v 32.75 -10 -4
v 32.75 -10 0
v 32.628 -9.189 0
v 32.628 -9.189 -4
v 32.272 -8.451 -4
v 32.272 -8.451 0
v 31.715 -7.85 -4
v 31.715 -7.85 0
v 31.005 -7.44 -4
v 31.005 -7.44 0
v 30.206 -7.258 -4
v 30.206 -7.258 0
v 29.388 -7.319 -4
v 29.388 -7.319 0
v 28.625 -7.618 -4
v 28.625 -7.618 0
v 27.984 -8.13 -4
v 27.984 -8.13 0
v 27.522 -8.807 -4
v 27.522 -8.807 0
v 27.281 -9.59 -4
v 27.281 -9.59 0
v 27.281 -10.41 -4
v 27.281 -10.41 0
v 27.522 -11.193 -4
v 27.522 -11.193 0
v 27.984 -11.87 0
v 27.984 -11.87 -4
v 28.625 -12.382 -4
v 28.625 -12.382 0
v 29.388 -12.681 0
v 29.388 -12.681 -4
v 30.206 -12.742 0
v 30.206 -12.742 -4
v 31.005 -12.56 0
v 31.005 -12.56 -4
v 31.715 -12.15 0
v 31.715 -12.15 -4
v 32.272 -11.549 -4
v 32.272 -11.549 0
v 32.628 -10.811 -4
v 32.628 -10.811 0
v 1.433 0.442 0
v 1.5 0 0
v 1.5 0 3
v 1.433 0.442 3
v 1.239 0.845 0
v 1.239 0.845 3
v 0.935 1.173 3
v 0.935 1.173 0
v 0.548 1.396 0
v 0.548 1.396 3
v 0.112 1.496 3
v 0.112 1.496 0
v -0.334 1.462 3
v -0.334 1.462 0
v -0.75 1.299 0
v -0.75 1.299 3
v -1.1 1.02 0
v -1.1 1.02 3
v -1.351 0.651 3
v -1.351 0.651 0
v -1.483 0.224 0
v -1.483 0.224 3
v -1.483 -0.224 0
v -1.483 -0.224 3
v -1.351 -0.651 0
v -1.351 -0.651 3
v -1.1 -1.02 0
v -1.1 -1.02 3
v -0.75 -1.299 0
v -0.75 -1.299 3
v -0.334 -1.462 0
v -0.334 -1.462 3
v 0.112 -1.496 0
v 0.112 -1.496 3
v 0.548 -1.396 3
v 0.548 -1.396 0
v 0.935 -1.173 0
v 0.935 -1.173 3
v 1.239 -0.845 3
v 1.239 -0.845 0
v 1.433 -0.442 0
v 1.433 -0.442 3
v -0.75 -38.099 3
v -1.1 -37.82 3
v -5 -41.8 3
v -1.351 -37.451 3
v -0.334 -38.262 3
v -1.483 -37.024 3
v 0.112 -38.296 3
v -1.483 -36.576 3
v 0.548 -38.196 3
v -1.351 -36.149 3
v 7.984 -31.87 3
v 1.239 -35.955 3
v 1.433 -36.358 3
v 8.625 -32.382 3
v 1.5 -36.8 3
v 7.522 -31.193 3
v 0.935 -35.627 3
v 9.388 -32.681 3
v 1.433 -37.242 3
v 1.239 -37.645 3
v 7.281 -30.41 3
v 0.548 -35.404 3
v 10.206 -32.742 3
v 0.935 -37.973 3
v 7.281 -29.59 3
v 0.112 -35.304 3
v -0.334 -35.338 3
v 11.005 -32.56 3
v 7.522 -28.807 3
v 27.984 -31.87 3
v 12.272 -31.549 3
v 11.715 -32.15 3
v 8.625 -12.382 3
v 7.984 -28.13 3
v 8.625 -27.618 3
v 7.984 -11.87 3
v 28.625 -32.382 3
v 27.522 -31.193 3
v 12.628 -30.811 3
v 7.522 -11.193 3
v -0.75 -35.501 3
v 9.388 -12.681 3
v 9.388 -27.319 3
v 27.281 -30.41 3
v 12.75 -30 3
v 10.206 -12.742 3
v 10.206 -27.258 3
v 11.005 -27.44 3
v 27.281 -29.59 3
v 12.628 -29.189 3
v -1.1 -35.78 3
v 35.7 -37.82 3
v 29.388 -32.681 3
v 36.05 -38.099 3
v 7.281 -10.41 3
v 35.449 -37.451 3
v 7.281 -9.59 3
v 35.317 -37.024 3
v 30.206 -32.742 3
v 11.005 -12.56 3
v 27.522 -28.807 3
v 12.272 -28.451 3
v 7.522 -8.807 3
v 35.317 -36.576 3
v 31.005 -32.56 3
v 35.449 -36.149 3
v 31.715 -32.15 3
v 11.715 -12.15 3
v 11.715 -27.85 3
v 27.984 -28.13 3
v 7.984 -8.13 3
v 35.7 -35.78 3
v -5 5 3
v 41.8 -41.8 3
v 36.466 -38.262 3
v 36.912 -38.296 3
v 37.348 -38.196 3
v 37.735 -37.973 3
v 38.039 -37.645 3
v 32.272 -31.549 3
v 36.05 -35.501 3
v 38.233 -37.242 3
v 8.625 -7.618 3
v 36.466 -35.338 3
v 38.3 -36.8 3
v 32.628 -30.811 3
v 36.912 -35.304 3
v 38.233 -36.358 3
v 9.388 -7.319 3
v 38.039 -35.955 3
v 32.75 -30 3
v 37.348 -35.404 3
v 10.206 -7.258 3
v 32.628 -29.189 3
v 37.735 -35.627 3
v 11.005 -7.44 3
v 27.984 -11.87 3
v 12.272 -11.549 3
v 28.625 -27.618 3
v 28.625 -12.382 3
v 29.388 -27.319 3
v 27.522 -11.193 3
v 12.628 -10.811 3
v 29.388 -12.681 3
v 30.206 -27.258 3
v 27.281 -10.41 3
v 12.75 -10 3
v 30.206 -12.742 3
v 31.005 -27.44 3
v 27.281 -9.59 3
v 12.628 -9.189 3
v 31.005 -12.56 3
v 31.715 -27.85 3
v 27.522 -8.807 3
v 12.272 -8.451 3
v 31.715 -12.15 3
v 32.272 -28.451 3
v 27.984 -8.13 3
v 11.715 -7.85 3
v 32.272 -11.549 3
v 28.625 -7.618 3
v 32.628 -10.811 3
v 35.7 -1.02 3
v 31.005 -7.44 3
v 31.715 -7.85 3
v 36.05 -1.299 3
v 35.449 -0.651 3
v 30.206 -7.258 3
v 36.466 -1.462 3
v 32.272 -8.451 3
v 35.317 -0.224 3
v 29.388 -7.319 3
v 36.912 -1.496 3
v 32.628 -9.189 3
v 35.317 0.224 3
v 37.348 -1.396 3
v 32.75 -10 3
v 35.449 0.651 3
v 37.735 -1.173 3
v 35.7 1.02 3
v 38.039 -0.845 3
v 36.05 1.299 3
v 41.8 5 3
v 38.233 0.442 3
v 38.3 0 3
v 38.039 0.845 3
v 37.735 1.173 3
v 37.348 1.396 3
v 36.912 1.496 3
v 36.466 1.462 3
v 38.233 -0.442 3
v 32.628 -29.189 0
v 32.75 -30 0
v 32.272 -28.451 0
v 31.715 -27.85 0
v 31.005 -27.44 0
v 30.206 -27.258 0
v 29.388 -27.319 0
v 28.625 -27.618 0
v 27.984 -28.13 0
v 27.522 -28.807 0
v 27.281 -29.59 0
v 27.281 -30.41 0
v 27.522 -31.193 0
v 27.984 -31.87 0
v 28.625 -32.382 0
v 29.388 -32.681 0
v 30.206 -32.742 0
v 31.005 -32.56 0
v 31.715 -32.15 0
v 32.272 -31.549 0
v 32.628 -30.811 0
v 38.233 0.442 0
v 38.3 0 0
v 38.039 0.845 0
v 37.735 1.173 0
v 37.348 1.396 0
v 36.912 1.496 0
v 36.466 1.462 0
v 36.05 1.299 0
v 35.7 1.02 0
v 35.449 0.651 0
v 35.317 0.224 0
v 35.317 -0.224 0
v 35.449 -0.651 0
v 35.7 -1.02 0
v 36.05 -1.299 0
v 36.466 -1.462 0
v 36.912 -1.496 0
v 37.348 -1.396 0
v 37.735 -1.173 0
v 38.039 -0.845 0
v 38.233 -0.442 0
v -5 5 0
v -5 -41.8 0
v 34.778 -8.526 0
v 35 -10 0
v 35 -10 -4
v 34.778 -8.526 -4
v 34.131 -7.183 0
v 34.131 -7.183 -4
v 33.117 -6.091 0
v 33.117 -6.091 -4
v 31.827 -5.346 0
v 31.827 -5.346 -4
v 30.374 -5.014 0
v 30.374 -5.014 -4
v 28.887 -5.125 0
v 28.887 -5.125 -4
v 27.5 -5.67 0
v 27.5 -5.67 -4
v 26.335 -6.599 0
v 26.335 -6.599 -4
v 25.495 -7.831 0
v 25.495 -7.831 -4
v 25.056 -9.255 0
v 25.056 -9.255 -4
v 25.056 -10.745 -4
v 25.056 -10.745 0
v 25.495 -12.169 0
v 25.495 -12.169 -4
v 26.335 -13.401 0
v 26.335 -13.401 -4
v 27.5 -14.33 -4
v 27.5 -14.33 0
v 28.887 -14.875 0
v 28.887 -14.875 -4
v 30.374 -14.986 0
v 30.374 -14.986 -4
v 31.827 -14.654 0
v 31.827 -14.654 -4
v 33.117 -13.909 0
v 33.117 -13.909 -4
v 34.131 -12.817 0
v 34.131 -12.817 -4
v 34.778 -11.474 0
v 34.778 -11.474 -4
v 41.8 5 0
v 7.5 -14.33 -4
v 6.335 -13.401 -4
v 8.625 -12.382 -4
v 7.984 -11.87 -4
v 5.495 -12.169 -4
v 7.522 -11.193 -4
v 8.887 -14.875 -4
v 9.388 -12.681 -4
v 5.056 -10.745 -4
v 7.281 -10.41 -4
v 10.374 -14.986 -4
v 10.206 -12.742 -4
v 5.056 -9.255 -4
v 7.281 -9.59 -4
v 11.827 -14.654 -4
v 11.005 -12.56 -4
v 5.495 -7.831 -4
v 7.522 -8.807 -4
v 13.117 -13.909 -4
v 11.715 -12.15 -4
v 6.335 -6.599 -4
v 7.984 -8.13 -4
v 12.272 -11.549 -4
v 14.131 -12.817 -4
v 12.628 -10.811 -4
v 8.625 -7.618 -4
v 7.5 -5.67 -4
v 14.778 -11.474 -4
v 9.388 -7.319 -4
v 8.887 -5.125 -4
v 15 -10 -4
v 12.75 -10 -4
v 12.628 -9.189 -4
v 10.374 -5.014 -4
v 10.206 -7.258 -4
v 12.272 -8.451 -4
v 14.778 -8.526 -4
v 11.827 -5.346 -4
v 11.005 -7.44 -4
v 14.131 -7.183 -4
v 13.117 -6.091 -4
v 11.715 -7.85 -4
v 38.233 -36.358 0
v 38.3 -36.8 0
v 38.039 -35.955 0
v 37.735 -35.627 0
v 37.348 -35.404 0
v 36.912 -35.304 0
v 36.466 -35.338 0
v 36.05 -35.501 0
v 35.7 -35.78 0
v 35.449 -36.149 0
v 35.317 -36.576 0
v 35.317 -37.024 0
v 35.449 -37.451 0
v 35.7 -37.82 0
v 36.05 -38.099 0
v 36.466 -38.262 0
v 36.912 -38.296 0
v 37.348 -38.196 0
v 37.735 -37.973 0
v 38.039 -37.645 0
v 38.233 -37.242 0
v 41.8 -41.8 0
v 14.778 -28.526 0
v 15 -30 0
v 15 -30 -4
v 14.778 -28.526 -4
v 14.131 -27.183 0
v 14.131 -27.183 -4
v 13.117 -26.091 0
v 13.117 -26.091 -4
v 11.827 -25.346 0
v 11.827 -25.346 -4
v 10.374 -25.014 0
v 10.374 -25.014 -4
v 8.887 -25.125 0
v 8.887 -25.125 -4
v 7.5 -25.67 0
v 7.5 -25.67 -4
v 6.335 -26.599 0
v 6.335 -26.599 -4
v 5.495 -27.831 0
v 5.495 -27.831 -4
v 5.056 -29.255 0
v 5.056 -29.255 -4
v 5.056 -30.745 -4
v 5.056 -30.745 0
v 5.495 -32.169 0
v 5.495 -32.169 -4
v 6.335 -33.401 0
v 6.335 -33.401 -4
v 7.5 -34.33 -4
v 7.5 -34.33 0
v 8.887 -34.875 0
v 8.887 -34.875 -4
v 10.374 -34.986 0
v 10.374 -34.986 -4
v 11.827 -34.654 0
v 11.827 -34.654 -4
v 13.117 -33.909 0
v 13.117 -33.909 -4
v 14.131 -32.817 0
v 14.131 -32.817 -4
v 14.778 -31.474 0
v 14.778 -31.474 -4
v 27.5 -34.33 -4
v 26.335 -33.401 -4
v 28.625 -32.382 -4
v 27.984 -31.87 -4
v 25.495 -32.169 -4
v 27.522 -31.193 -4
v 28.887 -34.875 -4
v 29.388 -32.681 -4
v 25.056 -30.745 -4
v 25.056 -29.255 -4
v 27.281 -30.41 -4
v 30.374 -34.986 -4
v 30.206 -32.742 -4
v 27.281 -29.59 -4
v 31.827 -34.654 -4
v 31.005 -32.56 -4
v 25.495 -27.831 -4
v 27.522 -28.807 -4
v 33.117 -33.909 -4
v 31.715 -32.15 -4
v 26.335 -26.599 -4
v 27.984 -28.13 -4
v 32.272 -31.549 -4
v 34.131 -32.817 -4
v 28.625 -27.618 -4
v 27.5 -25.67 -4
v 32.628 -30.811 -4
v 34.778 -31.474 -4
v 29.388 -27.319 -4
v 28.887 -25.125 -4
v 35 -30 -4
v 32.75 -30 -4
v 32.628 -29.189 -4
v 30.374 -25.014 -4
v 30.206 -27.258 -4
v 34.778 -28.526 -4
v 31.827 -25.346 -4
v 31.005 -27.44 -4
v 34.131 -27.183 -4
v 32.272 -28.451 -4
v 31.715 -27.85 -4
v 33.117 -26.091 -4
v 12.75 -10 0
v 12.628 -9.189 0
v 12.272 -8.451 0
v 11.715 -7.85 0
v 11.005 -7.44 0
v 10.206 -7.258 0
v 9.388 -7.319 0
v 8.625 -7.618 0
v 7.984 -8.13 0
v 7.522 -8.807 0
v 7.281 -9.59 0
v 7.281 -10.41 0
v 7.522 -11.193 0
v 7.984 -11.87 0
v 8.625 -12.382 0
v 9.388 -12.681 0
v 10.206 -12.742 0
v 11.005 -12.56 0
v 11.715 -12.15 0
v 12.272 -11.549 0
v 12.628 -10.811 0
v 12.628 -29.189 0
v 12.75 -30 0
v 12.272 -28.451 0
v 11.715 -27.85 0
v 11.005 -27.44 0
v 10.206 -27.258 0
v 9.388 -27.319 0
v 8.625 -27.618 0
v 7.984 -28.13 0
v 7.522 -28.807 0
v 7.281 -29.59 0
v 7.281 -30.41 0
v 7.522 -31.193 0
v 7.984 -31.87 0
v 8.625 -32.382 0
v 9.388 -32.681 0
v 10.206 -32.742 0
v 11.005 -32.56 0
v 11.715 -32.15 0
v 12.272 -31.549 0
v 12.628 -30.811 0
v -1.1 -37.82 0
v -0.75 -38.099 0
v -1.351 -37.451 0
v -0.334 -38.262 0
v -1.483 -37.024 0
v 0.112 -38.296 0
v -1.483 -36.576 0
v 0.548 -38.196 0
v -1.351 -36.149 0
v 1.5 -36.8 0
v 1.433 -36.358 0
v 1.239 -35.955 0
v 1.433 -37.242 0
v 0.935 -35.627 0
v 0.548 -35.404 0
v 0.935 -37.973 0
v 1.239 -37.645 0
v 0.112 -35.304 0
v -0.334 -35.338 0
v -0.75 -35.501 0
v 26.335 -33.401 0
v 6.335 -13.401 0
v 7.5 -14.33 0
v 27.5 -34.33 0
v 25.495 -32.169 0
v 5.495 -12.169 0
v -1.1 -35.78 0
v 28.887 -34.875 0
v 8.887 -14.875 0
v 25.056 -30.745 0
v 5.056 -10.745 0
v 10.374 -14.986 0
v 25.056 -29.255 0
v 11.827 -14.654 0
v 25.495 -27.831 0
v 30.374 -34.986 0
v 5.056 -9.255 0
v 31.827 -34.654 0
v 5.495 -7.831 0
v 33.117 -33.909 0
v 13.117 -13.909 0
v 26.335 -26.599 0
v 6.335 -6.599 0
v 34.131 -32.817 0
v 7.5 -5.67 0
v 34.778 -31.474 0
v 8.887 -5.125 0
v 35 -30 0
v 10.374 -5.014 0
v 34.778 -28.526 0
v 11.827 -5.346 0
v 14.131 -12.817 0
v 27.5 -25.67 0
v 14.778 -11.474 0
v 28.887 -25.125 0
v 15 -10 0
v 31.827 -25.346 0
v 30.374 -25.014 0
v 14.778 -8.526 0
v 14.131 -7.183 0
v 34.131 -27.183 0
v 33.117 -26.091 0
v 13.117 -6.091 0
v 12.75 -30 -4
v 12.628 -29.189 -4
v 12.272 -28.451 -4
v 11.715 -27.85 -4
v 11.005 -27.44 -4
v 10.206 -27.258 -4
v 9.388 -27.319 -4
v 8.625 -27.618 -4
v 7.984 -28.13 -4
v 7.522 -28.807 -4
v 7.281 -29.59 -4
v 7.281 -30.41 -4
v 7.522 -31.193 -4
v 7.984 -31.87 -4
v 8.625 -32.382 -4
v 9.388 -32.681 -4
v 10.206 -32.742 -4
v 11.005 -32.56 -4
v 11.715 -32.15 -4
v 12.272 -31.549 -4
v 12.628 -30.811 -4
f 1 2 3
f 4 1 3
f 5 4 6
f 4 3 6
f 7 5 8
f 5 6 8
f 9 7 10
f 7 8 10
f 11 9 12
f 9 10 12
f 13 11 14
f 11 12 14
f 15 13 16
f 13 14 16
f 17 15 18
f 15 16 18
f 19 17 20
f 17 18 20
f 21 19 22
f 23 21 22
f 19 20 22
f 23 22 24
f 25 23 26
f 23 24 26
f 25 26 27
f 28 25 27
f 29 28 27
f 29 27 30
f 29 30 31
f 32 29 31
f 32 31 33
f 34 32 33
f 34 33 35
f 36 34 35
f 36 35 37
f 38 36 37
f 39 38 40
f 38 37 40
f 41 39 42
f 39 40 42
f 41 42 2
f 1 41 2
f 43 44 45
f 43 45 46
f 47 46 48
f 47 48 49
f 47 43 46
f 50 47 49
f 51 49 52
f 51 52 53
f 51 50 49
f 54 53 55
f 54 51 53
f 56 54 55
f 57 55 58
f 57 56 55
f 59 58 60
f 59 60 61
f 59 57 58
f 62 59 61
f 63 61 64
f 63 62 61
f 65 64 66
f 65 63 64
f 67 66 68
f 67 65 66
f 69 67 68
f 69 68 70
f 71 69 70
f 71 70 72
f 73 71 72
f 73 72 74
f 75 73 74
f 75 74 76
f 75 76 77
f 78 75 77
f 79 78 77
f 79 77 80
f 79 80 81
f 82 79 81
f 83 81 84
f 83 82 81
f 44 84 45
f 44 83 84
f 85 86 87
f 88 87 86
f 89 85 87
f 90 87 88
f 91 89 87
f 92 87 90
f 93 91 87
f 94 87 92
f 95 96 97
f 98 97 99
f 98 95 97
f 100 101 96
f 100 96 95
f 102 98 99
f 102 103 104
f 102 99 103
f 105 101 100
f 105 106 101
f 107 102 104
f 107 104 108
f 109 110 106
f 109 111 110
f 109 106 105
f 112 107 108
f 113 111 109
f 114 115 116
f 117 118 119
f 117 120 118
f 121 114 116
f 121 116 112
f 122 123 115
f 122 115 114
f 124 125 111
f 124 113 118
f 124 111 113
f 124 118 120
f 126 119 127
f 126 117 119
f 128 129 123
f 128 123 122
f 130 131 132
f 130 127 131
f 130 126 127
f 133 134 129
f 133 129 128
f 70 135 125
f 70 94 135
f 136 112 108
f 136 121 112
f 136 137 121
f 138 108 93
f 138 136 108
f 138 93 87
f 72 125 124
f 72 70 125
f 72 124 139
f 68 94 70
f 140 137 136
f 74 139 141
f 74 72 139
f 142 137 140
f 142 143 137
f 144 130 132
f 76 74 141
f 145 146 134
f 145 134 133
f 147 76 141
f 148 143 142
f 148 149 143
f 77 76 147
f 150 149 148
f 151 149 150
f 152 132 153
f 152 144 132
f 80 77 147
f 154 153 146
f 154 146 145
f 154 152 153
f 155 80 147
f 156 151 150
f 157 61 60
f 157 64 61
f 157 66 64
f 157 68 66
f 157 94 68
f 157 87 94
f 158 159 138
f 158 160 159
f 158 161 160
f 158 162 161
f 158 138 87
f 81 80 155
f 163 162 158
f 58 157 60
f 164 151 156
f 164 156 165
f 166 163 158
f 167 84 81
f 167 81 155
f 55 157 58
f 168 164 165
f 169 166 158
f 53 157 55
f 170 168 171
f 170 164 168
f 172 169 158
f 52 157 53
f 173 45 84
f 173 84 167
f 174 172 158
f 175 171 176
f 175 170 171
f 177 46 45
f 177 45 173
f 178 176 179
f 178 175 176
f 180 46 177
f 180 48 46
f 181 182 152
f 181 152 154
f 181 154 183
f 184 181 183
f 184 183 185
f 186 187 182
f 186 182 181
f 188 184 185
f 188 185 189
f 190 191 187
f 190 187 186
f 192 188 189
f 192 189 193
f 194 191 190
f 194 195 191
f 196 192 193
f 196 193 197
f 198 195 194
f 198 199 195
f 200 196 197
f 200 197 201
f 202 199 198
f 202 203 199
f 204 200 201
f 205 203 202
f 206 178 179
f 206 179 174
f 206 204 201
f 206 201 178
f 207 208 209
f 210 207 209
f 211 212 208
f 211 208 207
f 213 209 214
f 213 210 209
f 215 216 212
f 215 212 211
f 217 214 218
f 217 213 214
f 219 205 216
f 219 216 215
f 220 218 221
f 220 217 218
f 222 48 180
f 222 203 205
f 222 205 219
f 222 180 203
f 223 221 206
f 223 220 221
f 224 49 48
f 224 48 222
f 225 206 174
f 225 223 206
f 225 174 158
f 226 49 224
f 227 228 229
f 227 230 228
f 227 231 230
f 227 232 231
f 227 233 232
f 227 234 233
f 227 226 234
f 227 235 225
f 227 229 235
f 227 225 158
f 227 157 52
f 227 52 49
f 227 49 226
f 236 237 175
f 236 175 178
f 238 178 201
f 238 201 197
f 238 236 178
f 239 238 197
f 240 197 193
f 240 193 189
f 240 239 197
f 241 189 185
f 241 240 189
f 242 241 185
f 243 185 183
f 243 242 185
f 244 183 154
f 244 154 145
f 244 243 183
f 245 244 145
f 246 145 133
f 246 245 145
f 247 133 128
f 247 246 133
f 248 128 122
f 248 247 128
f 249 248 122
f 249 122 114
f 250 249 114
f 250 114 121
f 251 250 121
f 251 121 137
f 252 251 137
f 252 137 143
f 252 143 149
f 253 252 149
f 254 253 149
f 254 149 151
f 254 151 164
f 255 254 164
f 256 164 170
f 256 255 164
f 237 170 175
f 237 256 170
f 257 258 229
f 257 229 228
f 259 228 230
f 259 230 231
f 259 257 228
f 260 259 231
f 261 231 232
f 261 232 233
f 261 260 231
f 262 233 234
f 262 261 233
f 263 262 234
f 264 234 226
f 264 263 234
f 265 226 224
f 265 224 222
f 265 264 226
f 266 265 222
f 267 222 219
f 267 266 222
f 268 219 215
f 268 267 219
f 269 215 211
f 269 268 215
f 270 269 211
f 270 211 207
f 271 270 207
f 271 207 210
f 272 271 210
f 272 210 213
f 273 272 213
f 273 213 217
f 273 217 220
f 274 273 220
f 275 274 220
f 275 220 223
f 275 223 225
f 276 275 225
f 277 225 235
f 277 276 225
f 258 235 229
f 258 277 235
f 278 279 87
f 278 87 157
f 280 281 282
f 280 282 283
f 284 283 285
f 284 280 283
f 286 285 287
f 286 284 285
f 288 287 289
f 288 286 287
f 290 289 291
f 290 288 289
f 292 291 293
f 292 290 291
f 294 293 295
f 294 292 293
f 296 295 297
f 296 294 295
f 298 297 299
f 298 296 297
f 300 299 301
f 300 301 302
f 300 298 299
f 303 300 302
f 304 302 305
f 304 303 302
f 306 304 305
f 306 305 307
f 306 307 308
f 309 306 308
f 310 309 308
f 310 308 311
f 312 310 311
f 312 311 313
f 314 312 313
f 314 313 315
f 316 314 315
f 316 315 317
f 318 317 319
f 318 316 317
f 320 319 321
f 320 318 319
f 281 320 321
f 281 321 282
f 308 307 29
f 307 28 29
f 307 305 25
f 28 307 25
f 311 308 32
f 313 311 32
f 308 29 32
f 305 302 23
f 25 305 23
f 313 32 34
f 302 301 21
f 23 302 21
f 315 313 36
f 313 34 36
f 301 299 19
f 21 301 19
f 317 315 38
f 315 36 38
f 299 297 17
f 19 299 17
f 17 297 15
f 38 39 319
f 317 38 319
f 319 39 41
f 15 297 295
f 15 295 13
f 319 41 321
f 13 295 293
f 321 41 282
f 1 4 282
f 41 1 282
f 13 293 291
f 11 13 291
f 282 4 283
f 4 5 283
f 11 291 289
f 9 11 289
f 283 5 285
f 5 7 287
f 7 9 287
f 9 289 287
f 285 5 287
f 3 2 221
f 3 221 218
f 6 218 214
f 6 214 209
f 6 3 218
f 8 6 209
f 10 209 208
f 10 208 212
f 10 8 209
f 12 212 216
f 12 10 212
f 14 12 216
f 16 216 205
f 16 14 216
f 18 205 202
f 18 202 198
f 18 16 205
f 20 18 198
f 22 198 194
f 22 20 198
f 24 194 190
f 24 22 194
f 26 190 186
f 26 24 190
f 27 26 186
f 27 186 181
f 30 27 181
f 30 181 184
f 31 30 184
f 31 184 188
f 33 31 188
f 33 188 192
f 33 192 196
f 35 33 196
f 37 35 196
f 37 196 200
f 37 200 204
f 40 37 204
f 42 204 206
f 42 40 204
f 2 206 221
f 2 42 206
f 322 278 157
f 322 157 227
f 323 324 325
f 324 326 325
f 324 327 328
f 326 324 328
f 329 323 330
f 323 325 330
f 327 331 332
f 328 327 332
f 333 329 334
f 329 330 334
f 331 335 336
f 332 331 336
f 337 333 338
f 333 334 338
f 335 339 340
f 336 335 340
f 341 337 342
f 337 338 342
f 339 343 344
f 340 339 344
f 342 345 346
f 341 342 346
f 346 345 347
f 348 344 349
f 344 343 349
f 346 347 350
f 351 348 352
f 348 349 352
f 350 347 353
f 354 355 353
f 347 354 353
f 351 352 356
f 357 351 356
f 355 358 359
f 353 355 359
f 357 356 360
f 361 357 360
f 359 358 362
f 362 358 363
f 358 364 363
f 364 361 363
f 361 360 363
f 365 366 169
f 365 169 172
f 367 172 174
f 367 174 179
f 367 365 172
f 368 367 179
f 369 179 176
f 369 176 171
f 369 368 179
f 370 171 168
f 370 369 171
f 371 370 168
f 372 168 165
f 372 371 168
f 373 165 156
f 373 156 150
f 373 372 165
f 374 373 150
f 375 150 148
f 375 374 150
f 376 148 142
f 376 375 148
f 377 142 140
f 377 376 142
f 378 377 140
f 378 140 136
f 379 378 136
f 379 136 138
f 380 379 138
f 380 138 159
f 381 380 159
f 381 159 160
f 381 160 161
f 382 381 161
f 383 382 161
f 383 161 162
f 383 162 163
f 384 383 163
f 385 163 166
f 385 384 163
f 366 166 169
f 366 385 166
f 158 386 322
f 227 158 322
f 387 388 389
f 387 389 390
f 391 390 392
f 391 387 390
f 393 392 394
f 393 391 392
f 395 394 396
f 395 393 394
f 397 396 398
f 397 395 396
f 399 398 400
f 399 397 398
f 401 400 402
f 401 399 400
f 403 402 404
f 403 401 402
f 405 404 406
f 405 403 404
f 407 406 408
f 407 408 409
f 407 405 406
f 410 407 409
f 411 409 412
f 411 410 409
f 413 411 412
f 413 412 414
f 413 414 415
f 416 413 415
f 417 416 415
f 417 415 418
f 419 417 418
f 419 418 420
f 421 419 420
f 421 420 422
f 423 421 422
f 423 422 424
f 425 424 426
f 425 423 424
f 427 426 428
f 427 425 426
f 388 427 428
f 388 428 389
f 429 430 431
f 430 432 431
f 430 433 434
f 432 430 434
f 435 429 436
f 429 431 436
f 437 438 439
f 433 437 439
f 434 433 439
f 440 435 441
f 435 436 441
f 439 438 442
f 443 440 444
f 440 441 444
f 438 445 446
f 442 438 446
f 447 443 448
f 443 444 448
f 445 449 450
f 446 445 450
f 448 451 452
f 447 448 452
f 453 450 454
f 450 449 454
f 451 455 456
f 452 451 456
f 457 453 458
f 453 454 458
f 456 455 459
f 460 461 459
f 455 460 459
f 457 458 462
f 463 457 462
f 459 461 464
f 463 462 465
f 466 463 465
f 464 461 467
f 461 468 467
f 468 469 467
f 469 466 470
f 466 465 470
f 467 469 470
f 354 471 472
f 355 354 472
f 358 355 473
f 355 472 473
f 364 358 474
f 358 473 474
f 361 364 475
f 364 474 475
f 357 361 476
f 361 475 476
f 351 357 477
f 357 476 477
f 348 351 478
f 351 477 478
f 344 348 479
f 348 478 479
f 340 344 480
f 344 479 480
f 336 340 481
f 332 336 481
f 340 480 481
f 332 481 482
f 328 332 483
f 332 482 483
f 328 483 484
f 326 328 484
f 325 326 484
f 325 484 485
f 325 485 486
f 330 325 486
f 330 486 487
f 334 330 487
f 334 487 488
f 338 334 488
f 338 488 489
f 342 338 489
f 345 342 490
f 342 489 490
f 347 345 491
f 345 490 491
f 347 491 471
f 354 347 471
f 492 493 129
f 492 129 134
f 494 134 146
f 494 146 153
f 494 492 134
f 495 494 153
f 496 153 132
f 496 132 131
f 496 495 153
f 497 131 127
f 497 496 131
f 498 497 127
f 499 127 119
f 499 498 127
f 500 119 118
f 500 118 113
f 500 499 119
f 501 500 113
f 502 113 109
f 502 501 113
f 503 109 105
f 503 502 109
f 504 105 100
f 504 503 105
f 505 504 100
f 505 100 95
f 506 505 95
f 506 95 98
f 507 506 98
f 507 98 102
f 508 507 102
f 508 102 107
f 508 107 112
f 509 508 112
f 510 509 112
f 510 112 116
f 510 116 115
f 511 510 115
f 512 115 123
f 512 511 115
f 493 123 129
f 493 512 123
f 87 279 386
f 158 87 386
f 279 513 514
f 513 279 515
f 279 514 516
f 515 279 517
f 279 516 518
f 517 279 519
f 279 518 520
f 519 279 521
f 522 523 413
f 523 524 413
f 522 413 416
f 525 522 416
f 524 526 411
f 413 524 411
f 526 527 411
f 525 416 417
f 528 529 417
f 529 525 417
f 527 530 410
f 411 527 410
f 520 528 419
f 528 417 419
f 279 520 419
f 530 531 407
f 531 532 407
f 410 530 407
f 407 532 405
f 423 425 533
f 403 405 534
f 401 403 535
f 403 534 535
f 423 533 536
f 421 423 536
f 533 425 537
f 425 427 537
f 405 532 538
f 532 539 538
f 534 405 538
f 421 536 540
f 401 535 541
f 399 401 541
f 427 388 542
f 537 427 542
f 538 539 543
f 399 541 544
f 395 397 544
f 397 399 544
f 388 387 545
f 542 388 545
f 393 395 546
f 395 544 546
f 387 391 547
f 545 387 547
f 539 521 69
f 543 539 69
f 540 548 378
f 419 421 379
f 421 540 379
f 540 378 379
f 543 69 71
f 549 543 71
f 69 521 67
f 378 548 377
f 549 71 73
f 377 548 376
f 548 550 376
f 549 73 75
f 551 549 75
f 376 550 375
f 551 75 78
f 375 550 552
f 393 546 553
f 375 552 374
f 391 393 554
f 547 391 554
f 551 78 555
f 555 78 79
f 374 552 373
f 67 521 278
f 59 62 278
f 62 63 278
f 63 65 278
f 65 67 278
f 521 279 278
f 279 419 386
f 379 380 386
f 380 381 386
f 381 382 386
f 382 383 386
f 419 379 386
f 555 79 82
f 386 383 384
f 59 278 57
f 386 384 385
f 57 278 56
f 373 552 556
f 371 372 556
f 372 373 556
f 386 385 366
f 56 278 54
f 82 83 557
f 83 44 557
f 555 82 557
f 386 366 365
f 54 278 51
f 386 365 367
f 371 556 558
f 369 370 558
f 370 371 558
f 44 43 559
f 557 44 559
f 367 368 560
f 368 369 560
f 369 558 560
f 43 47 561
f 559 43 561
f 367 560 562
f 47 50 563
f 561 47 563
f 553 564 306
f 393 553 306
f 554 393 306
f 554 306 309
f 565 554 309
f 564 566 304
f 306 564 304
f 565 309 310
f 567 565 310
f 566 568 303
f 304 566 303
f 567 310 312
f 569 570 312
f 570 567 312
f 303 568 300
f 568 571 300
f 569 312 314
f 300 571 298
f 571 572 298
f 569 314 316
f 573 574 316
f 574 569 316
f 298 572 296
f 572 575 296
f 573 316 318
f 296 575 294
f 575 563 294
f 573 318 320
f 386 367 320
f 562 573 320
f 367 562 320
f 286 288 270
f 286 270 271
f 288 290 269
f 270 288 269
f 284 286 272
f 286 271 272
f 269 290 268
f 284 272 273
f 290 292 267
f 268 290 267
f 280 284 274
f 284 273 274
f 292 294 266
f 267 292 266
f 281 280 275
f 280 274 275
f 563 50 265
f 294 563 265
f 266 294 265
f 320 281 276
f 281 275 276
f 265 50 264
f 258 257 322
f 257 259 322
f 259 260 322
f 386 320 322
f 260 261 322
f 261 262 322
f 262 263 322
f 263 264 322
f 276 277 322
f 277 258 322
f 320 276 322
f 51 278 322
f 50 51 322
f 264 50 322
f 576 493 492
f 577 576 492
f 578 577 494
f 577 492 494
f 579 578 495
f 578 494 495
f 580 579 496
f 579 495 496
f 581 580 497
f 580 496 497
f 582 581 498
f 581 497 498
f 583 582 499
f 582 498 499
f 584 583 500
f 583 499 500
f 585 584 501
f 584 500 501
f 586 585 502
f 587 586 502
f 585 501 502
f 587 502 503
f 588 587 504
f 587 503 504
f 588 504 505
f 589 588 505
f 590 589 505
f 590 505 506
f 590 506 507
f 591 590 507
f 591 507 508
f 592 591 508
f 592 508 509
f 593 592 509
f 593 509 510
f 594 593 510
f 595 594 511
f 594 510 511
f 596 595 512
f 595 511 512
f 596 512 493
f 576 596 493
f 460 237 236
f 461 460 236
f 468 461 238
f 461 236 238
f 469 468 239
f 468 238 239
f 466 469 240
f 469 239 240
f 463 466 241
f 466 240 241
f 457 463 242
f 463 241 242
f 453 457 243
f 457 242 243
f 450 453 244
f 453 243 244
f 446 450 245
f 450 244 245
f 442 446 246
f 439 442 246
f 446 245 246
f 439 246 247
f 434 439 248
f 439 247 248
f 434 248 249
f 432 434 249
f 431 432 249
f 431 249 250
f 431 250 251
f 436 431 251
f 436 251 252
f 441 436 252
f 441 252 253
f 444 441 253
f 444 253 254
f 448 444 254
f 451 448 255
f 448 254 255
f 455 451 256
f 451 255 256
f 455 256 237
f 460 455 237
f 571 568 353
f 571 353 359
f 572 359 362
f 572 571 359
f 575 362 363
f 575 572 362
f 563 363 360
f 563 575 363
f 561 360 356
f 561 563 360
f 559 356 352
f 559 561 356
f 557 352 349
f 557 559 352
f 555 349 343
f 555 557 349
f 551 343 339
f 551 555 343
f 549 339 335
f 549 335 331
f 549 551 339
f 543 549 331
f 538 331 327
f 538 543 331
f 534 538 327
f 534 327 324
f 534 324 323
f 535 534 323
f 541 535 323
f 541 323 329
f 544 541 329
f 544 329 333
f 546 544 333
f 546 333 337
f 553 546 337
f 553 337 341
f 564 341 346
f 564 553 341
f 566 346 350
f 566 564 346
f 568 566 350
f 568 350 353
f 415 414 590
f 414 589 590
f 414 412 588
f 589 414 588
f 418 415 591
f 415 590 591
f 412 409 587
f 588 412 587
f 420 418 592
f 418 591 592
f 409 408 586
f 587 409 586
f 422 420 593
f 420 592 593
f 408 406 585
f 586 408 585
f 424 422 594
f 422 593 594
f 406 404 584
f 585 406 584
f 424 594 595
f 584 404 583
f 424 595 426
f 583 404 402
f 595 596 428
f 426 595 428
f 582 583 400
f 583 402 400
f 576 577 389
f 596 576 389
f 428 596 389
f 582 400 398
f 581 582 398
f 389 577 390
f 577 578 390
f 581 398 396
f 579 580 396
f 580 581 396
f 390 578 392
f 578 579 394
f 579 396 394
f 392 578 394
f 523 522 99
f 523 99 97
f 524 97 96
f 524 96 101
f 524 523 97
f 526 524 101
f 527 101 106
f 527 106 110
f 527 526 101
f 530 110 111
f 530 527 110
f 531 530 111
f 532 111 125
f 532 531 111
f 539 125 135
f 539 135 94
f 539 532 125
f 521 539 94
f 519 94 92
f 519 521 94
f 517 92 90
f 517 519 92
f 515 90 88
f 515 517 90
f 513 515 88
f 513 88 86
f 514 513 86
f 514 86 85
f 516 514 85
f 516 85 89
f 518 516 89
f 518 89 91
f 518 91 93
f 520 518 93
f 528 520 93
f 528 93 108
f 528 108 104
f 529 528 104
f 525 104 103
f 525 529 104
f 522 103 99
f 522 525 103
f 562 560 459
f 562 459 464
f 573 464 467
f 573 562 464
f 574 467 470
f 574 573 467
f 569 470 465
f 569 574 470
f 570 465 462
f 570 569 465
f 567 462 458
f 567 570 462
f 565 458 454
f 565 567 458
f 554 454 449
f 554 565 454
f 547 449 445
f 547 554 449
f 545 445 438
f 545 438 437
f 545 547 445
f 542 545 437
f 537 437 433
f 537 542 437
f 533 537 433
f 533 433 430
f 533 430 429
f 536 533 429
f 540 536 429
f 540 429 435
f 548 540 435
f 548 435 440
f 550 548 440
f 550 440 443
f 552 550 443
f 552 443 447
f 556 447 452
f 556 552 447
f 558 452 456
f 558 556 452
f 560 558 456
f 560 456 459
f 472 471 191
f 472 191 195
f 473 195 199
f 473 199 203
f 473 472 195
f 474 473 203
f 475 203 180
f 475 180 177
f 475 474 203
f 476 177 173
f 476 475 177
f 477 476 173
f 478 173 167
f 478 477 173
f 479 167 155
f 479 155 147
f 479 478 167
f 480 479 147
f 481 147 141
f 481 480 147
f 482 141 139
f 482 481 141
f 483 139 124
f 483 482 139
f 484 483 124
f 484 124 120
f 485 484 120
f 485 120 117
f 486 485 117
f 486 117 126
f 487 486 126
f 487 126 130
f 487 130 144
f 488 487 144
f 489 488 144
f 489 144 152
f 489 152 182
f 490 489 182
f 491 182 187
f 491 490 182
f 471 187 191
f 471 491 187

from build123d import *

# Parameters (mm, degrees)
SKETCH_W      = 46.8
SKETCH_H      = 46.8
SKETCH_R      = 2.75
SKETCH_R_2    = 1.5
PAD_DEPTH     = 3
SKETCH001_R   = 5
SKETCH001_R_2 = 2.75
PAD001_DEPTH  = 4


with BuildPart() as part:
    # Sketch → Pad (new body)
    with BuildSketch(Plane.XY):
        with Locations((18.4, -18.4)):
            Rectangle(SKETCH_W, SKETCH_H)
        with Locations((10, -10)):
            Circle(SKETCH_R, mode=Mode.SUBTRACT)
        with Locations((30, -10)):
            Circle(SKETCH_R, mode=Mode.SUBTRACT)
        with Locations((30, -30)):
            Circle(SKETCH_R, mode=Mode.SUBTRACT)
        with Locations((10, -30)):
            Circle(SKETCH_R, mode=Mode.SUBTRACT)
        Circle(SKETCH_R_2, mode=Mode.SUBTRACT)
        with Locations((36.8, 0)):
            Circle(SKETCH_R_2, mode=Mode.SUBTRACT)
        with Locations((0, -36.8)):
            Circle(SKETCH_R_2, mode=Mode.SUBTRACT)
        with Locations((36.8, -36.8)):
            Circle(SKETCH_R_2, mode=Mode.SUBTRACT)
    extrude(amount=PAD_DEPTH)

    # Sketch001 → Pad001 (join)
    with BuildSketch(Plane.XY):
        with Locations((30, -10)):
            Circle(SKETCH001_R)
        with Locations((30, -10)):
            Circle(SKETCH001_R_2, mode=Mode.SUBTRACT)
        with Locations((10, -10)):
            Circle(SKETCH001_R)
        with Locations((10, -10)):
            Circle(SKETCH001_R_2, mode=Mode.SUBTRACT)
        with Locations((10, -30)):
            Circle(SKETCH001_R)
        with Locations((10, -30)):
            Circle(SKETCH001_R_2, mode=Mode.SUBTRACT)
        with Locations((30, -30)):
            Circle(SKETCH001_R)
        with Locations((30, -30)):
            Circle(SKETCH001_R_2, mode=Mode.SUBTRACT)
    extrude(amount=-PAD001_DEPTH)


solid = part.part
